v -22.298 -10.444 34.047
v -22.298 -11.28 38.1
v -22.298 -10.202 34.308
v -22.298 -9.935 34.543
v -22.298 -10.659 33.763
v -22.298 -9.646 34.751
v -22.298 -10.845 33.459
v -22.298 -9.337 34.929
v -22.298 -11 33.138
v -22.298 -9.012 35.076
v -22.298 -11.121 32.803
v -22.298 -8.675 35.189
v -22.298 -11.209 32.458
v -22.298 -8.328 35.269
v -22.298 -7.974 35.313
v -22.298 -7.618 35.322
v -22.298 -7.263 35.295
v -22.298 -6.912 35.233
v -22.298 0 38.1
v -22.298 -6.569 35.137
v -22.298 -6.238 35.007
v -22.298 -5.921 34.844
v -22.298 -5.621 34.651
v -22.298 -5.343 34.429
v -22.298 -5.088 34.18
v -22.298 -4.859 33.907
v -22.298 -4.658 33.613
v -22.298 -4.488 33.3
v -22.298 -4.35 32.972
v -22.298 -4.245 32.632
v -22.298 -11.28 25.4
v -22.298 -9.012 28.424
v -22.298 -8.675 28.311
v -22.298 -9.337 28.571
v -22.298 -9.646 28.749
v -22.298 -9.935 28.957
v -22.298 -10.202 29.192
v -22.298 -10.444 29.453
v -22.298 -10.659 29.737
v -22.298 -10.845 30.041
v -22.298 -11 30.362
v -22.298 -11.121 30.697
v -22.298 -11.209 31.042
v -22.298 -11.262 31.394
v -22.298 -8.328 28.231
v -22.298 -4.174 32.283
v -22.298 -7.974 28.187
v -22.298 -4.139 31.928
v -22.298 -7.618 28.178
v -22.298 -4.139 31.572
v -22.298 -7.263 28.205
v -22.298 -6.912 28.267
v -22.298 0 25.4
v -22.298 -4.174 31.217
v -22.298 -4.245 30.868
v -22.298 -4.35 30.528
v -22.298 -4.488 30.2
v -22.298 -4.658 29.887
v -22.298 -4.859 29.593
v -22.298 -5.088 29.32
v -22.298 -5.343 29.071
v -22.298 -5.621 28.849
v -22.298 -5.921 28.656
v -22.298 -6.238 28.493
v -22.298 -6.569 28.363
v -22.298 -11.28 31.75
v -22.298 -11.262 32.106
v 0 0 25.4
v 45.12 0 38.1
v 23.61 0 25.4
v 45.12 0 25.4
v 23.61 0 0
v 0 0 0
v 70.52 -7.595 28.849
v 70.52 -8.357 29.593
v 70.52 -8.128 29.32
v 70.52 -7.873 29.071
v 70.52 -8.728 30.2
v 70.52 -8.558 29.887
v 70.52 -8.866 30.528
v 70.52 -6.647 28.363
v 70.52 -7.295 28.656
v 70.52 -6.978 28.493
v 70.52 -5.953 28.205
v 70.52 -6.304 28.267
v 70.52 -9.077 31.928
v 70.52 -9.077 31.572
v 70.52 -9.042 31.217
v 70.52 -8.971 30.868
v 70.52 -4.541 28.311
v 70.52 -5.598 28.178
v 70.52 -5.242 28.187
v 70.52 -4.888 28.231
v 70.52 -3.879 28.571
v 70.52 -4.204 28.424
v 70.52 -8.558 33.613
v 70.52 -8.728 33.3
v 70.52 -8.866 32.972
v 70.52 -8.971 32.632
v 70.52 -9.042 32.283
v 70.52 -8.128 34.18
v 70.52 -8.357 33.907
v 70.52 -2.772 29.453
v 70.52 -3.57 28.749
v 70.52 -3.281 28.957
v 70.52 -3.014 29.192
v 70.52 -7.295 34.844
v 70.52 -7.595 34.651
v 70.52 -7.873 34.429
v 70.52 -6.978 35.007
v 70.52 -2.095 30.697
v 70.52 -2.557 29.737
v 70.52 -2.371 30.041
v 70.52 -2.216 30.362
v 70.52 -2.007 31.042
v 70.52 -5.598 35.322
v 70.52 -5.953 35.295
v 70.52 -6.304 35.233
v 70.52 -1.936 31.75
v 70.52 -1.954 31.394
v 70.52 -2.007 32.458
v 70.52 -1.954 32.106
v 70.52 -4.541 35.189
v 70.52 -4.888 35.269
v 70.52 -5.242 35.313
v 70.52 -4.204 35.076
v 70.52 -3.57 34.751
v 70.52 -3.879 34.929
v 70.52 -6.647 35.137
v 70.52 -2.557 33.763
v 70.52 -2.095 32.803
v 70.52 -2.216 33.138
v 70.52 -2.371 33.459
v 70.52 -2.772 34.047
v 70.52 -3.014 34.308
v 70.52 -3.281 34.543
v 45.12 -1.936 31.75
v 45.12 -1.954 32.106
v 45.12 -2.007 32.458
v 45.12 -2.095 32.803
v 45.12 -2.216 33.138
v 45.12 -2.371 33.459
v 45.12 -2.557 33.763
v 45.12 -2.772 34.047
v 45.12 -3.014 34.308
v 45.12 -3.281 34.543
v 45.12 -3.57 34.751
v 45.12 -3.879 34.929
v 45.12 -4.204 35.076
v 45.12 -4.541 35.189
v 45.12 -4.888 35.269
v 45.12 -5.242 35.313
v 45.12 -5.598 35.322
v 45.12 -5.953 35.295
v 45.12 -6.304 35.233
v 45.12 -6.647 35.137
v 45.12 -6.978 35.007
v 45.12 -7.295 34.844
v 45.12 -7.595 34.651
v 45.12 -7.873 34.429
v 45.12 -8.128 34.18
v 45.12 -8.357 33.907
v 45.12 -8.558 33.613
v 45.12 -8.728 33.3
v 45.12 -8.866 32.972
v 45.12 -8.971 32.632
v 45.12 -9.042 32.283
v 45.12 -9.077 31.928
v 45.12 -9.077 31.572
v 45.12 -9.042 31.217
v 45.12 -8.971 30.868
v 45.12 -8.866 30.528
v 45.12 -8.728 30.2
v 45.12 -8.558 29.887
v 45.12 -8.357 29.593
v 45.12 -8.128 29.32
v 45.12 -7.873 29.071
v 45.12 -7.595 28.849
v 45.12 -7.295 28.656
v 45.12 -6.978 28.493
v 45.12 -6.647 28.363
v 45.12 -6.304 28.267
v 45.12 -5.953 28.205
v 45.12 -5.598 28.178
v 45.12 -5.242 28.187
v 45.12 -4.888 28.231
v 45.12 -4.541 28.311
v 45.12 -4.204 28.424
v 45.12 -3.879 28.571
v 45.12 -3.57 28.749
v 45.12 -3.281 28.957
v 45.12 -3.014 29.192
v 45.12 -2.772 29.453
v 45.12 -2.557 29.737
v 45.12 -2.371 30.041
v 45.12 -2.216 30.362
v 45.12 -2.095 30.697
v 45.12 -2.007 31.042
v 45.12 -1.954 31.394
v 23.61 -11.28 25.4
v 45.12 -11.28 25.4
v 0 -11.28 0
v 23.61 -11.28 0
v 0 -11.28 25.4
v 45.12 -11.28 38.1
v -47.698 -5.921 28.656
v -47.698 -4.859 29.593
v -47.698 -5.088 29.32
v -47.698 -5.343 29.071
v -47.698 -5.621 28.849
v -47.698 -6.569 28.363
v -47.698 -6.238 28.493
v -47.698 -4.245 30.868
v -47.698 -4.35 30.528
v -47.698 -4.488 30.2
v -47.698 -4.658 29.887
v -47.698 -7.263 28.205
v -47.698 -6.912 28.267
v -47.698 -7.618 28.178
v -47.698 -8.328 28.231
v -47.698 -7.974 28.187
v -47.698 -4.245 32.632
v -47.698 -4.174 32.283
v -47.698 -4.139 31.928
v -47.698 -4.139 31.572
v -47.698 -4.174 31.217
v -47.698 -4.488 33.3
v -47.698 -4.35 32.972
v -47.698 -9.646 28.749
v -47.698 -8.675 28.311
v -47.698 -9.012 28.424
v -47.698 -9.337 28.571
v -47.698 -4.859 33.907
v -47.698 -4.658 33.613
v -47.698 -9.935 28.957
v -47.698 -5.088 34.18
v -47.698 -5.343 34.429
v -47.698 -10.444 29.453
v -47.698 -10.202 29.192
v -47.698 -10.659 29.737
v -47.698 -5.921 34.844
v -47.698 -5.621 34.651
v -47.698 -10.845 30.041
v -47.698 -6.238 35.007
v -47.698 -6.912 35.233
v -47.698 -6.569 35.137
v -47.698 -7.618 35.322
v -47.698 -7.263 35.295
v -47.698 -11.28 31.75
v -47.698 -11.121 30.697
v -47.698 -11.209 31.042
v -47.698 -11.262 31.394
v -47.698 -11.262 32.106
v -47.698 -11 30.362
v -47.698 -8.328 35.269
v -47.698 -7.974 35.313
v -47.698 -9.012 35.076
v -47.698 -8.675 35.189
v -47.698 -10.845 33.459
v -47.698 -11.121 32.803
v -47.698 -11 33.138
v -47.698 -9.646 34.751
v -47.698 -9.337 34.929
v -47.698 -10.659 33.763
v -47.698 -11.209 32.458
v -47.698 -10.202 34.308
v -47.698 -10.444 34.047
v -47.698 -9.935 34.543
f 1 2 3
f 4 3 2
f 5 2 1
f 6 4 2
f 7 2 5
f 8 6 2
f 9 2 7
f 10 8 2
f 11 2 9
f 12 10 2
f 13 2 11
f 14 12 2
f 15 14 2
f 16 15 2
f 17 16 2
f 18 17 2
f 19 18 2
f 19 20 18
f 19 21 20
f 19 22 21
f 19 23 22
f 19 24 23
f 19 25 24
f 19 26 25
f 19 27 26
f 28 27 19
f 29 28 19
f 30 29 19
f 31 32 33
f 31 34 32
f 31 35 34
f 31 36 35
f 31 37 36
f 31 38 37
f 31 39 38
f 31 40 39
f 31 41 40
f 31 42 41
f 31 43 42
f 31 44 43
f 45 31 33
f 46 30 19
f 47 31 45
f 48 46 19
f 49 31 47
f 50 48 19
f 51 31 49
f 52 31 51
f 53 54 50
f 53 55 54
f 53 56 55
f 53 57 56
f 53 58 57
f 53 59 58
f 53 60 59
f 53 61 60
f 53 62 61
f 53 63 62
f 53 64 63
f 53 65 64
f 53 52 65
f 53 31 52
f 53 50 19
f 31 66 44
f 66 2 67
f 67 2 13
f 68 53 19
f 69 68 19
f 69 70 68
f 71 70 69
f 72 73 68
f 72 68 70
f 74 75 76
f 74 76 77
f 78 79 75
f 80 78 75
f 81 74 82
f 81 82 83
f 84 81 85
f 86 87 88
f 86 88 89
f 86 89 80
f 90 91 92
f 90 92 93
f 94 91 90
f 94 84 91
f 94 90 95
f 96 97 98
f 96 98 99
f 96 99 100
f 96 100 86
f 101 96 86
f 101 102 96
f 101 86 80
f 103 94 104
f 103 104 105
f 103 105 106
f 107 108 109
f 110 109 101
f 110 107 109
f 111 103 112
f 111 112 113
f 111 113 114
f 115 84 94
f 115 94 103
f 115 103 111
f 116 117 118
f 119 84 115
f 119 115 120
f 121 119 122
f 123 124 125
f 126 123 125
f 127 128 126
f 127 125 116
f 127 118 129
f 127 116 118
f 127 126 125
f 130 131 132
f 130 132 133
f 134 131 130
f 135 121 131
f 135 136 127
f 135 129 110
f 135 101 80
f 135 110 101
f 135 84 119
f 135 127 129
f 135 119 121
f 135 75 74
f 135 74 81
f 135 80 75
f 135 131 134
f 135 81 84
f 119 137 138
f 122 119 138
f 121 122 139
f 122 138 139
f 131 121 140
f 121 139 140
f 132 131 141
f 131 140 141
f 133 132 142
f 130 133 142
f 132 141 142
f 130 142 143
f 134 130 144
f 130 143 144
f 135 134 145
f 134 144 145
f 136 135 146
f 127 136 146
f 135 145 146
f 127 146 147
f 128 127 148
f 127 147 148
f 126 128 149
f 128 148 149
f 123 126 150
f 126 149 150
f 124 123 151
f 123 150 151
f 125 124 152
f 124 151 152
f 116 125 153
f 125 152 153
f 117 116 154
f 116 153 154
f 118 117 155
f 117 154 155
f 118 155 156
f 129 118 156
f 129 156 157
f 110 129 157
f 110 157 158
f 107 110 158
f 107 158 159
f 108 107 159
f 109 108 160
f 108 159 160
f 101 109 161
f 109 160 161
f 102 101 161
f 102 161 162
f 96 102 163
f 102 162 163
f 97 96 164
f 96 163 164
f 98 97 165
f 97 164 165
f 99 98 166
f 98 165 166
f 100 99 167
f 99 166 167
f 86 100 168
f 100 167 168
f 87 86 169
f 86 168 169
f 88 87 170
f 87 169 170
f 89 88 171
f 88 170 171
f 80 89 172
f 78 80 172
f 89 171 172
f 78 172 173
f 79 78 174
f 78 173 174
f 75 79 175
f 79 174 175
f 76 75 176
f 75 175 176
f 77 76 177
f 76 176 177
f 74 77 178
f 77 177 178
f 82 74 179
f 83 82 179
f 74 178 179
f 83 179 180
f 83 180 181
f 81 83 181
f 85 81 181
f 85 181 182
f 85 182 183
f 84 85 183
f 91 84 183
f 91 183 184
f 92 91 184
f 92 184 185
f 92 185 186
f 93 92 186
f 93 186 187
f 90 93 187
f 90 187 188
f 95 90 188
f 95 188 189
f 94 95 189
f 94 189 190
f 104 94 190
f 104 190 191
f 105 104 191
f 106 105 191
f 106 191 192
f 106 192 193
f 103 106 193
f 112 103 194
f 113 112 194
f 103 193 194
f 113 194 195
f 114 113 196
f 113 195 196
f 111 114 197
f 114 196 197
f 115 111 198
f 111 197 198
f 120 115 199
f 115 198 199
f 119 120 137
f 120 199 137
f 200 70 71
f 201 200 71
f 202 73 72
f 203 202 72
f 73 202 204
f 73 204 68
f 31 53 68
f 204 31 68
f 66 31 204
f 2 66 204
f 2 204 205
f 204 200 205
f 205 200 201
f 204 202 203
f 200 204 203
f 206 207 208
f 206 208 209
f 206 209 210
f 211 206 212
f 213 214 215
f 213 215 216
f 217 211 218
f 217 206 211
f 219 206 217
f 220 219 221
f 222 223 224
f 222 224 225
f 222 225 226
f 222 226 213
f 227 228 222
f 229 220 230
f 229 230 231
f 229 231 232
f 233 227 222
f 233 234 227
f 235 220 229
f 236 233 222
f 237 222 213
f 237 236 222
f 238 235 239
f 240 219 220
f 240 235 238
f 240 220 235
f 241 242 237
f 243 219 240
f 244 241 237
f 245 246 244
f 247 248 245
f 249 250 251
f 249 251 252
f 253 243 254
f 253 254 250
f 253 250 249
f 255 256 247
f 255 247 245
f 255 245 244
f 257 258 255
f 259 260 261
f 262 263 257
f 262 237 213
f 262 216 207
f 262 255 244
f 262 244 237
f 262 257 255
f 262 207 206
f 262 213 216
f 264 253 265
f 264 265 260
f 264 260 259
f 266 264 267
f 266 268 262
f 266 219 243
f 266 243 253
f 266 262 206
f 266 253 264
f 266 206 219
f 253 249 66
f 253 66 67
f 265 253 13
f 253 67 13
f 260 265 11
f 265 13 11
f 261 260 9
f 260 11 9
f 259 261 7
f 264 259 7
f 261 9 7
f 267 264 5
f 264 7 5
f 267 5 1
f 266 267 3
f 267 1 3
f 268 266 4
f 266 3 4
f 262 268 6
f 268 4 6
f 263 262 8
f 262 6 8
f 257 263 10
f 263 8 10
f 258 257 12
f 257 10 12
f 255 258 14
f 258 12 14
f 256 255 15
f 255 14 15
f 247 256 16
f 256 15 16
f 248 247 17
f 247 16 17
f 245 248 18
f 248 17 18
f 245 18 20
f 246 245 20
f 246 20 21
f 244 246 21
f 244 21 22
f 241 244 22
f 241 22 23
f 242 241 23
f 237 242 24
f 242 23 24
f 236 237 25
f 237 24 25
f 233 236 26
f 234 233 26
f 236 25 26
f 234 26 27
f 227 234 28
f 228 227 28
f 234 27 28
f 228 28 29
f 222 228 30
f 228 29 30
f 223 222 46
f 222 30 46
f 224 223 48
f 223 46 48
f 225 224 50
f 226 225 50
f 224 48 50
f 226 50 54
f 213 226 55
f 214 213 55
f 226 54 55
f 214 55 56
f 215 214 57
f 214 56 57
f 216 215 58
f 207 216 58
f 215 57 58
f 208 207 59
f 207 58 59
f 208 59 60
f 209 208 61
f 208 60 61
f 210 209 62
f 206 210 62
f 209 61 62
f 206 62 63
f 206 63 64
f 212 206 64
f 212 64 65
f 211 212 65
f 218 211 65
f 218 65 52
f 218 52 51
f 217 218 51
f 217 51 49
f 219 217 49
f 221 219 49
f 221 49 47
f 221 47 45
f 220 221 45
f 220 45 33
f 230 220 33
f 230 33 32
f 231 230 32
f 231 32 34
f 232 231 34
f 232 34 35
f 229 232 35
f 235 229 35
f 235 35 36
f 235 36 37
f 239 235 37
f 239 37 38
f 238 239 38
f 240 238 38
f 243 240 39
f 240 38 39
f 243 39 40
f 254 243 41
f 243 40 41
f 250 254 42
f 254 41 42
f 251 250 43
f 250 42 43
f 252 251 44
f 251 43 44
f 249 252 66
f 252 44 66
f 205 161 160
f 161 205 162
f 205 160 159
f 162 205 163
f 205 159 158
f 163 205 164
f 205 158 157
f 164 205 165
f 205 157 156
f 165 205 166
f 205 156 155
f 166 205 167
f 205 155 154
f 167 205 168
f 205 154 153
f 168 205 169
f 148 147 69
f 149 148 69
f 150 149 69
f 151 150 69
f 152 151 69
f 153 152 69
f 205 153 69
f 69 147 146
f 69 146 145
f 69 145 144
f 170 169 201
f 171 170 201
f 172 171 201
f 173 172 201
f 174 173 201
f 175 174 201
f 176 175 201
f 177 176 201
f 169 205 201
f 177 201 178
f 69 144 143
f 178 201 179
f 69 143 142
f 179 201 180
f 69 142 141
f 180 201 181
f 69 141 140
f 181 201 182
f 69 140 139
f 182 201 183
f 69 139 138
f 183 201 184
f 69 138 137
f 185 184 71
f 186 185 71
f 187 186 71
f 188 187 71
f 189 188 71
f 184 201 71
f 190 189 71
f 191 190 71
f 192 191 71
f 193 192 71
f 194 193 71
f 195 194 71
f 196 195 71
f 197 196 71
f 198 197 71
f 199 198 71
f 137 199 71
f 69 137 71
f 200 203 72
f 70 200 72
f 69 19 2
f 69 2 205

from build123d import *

# Parameters (mm, degrees)
F0_W     = 23.6095096916
F0_H     = 11.28009893
F1_DEPTH = 25.4
F2_W     = 67.4182642251
F2_H     = 11.28009893
F3_DEPTH = 12.7
F4_R     = 3.5729490202
F5_DEPTH = 25.4
F6_R     = 3.5729545
F7_DEPTH = 25.4


with BuildPart() as f1:
    # F0 (on Top) → F1 (new body)
    with BuildSketch(Plane.XY):
        with Locations((11.8047548458, -5.640049465)):
            Rectangle(F0_W, F0_H)
    extrude(amount=F1_DEPTH)

    # F2 (on face) → F3 (join)
    with BuildSketch(Plane.XY.offset(25.4)):
        with Locations((11.4112636074, -5.640049465)):
            Rectangle(F2_W, F2_H)
    extrude(amount=F3_DEPTH)

    # F4 (on face) → F5 (join)
    with BuildSketch(Plane.YZ.offset(45.12039572)):
        with Locations((-5.5088857189, 31.75)):
            Circle(F4_R)
    extrude(amount=F5_DEPTH)

    # F6 (on face) → F7 (join)
    with BuildSketch(Plane(origin=(-22.2978685051, 0, 0), x_dir=(0, -1, 0), z_dir=(-1, 0, 0))):
        with Locations((7.70714443, 31.75)):
            Circle(F6_R)
    extrude(amount=F7_DEPTH)


solid = f1.part
